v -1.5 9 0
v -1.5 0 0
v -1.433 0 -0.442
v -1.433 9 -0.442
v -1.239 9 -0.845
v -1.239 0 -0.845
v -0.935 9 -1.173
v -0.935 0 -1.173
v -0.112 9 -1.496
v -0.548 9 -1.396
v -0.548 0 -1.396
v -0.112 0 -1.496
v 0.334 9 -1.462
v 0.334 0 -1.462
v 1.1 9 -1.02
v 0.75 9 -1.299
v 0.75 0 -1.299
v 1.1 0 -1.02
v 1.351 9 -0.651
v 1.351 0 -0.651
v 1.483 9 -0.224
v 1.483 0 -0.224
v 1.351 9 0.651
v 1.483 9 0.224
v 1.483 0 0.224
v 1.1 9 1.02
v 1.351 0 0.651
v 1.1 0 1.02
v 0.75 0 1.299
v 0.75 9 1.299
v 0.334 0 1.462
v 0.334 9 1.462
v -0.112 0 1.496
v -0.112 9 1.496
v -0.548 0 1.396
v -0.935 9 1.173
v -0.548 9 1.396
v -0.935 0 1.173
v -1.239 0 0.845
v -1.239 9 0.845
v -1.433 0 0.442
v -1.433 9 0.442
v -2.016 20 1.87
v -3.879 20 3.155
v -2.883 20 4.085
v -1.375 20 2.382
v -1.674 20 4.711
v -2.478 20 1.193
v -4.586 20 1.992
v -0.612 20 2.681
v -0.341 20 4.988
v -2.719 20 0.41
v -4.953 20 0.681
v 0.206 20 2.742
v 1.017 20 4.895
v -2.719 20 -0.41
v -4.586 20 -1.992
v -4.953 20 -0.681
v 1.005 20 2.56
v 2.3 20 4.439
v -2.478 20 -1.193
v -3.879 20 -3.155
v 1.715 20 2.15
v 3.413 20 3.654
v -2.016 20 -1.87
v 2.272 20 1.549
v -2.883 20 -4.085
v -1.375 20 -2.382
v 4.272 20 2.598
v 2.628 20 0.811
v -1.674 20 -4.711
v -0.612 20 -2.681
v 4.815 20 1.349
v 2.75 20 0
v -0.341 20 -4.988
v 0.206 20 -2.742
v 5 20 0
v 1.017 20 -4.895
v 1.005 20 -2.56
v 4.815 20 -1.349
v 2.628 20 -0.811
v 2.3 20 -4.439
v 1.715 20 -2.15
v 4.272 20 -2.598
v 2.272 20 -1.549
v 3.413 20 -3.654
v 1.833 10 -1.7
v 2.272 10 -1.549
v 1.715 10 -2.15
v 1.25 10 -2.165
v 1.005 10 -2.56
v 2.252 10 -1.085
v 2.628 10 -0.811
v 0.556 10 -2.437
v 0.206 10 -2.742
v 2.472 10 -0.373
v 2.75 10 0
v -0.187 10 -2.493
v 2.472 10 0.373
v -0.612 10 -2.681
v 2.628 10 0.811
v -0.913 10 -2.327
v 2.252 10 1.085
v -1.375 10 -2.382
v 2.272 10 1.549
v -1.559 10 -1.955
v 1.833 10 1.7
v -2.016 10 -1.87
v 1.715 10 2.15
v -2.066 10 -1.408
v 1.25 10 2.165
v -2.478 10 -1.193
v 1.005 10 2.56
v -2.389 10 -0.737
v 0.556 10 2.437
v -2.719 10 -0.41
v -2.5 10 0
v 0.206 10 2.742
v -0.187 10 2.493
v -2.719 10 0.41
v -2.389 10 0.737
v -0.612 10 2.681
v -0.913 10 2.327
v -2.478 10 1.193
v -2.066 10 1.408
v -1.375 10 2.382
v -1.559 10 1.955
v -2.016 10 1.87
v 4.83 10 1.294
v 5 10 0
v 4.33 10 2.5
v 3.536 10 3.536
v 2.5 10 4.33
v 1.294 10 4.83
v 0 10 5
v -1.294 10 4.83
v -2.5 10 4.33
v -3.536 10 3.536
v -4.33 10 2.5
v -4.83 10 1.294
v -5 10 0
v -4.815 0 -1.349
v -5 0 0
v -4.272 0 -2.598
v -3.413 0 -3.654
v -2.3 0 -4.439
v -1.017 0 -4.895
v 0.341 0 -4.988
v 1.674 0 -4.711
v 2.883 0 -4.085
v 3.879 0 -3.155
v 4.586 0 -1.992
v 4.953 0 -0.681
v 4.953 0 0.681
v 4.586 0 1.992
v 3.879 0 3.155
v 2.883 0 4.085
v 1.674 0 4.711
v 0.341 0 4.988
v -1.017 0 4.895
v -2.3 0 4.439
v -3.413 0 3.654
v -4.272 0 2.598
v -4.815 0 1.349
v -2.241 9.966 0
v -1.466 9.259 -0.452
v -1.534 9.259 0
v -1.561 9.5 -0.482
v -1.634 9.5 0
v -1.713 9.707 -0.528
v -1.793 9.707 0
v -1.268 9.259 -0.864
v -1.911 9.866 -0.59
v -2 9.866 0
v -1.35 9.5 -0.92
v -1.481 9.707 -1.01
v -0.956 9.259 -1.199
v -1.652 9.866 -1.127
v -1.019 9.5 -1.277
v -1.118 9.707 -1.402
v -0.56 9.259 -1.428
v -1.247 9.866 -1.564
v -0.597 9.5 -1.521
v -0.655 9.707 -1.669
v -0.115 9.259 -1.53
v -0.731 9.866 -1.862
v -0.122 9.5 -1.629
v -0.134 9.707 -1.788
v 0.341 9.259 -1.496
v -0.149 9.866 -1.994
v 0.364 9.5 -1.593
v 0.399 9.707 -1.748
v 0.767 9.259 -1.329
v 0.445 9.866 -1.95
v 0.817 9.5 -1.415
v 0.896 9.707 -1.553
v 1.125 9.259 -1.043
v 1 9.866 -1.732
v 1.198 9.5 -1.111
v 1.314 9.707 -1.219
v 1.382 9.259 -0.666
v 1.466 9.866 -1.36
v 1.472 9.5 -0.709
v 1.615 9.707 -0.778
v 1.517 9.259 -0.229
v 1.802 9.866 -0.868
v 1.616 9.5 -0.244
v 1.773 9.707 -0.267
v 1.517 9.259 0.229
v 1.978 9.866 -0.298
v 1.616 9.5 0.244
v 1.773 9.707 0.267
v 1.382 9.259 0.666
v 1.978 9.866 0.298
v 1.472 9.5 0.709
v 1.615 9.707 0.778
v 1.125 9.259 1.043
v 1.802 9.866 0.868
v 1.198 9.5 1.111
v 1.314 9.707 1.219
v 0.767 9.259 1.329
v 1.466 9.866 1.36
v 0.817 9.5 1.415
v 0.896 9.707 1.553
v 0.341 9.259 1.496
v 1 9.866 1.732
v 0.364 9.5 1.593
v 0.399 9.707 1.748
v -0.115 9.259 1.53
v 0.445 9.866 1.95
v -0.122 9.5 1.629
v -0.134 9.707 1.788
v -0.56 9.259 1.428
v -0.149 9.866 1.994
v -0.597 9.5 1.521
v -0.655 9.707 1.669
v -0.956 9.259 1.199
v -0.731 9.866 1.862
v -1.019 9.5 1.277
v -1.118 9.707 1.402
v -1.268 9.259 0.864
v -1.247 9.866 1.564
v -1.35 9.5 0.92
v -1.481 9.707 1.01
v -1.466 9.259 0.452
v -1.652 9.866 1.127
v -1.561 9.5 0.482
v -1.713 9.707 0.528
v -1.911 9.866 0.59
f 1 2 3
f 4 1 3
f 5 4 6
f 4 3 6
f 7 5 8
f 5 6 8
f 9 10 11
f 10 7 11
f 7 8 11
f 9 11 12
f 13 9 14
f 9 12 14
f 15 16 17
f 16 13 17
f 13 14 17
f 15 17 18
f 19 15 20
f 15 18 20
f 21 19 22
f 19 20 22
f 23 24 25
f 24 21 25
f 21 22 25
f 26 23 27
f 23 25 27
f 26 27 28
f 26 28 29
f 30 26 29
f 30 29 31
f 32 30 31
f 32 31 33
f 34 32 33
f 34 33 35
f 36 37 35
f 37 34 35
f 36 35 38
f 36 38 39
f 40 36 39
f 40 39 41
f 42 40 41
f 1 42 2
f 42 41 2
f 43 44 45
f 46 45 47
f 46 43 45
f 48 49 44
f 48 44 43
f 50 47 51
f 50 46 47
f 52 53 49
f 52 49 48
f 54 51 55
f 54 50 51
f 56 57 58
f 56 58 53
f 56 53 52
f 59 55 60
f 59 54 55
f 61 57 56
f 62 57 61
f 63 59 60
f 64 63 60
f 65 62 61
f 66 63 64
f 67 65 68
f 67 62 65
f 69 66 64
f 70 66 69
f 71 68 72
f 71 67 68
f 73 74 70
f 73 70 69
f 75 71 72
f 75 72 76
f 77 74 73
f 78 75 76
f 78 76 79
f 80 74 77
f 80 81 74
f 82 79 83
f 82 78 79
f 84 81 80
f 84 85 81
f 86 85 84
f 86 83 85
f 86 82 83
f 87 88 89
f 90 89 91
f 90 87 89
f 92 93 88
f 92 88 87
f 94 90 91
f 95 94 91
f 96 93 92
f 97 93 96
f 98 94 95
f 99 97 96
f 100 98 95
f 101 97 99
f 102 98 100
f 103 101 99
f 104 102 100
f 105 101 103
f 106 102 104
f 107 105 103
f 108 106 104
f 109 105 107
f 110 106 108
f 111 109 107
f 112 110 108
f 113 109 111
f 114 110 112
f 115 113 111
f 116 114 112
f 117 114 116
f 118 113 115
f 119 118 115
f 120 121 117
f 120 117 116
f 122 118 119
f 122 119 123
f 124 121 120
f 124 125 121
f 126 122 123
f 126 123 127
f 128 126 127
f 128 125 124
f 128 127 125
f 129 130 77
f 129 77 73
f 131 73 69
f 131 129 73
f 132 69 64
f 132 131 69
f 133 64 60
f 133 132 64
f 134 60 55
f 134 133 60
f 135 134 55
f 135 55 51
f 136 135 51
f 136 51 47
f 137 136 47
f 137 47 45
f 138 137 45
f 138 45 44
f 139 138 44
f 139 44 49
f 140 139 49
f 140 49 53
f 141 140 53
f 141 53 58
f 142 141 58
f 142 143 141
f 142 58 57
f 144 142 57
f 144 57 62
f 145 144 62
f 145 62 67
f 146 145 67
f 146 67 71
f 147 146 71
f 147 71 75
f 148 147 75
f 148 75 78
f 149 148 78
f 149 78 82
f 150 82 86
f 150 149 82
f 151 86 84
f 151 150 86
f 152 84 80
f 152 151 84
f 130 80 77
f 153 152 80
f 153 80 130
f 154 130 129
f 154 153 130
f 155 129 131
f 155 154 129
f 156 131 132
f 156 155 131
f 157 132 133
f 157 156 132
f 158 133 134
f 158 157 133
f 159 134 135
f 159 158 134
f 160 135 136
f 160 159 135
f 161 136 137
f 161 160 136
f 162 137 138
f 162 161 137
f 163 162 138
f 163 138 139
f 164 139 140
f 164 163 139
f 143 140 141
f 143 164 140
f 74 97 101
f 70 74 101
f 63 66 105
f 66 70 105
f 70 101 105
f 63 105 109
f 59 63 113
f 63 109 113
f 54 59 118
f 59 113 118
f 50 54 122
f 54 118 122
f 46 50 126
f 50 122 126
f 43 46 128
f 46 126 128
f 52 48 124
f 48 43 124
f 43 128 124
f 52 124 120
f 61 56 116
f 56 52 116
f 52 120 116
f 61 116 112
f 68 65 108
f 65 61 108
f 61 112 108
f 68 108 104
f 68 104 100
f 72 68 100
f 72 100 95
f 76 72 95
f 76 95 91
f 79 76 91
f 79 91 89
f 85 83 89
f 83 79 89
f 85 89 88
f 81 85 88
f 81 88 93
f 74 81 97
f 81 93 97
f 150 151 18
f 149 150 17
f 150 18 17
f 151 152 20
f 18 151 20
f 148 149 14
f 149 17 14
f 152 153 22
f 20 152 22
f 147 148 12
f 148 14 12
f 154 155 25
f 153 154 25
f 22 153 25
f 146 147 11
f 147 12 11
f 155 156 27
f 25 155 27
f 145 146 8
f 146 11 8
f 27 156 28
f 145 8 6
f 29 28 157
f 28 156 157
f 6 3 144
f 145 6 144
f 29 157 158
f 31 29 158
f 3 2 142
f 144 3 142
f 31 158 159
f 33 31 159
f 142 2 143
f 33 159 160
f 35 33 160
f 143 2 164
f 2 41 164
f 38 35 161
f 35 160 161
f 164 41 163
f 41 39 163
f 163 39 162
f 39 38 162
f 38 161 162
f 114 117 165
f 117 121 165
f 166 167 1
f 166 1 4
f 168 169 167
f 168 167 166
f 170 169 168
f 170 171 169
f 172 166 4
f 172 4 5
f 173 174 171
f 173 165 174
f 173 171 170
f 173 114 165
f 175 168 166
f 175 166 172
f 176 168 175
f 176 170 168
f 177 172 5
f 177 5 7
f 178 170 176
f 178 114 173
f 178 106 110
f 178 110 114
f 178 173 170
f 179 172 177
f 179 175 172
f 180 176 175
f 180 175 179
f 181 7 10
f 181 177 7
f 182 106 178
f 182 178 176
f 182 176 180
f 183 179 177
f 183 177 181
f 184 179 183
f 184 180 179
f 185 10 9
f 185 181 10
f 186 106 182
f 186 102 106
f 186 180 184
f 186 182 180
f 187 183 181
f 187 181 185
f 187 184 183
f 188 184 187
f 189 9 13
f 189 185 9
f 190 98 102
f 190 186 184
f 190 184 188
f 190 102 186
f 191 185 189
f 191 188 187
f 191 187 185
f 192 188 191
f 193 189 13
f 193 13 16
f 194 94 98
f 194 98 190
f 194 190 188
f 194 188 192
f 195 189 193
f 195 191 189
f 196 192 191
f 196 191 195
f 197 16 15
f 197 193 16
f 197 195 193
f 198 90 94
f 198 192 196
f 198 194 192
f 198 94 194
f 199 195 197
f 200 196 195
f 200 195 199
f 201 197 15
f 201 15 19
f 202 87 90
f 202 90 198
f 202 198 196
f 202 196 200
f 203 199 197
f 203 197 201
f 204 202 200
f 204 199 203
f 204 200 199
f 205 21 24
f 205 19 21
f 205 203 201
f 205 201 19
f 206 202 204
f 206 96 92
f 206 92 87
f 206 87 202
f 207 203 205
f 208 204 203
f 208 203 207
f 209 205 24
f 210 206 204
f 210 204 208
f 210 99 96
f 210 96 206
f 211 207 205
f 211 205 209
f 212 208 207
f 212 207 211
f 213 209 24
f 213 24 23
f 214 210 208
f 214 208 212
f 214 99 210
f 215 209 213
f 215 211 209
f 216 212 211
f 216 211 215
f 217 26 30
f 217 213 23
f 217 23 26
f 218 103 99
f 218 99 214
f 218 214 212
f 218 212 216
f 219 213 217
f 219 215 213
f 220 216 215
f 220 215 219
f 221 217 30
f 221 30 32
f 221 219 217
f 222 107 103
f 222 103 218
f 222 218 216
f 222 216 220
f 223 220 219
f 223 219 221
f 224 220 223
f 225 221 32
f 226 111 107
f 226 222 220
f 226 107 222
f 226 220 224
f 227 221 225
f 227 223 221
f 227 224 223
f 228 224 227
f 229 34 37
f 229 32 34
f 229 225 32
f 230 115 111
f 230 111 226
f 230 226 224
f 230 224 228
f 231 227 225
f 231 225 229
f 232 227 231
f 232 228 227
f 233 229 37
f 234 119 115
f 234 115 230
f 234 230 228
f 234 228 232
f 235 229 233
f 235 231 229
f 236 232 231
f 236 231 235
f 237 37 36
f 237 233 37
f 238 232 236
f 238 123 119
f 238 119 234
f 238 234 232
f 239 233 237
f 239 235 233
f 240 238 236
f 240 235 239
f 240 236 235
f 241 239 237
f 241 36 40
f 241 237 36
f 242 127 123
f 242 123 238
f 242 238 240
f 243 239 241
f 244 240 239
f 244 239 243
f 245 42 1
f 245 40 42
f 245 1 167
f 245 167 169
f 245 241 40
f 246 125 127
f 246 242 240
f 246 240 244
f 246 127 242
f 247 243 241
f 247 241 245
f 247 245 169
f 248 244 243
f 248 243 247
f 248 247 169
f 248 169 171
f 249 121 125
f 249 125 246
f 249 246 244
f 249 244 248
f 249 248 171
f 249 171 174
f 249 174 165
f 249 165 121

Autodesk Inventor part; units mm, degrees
ref_plane "YZ Plane" through (0, 0, 0) normal (1, 0, 0) x (0, 1, 0)
ref_plane "XZ Plane" through (0, 0, 0) normal (0, 1, 0) x (-1, 0, 0)
ref_plane "XY Plane" through (0, 0, 0) normal (0, 0, 1) x (1, 0, 0)
sketch "Sketch1" plane through (0, 0, 0) normal (0, 1, 0) x (-1, 0, 0)
  circle A0 centre (0, 0) radius 5
  circle A1 centre (0, 0) radius 1.5
  dimension "d0" = 10
  dimension "d1" = 3
extrude "Extrusion1" add sketch "Sketch1" along normal blind 10
sketch "Sketch2" plane through (0, 10, 0) normal (0, 1, 0) x (1, 0, 0)
  circle A0 centre (0, 0) radius 2.75
  circle A1 centre (0, 0) radius 5
  dimension "d4" = 5.5
extrude "Extrusion2" add sketch "Sketch2" along normal blind 10
thread "Thread1" size "M3x0.5" class "6H" standard "ANSI Metric M Profile" length 14
fillet "Fillet1" radius 1 1 edges at (1.5, 10, 0)
thread "Thread3" size "M5.5x0.5" class "6H" standard "ANSI Metric M Profile" length 14
properties part number "platform_adapter"
